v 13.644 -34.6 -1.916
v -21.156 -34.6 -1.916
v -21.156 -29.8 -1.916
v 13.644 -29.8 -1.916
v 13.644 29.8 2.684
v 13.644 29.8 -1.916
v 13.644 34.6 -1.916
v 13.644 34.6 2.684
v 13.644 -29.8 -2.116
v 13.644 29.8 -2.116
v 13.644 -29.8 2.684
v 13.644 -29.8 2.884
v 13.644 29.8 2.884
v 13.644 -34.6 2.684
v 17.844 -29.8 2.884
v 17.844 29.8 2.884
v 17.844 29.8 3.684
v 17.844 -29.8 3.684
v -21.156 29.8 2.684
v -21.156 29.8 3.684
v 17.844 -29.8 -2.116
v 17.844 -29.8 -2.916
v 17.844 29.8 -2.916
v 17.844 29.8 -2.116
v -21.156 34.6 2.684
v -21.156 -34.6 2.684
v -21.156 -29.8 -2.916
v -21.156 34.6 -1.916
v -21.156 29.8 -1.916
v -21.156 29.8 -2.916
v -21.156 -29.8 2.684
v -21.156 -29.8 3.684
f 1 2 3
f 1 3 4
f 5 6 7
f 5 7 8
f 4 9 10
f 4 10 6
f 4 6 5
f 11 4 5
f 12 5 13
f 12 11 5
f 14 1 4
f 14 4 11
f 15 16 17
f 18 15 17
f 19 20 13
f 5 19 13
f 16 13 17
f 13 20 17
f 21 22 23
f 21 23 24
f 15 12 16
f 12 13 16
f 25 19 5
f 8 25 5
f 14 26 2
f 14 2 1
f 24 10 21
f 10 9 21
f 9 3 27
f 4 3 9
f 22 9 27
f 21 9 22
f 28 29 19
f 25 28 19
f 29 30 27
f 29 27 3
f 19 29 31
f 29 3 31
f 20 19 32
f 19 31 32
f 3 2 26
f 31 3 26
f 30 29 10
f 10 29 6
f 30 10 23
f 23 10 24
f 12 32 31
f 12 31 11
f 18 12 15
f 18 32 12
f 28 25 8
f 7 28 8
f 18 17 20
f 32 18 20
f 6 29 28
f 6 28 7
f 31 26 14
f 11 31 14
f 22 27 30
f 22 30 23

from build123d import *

# Parameters (mm, degrees)
F0_W     = 34.8
F0_H     = 4.6
F1_DEPTH = 34.6
F0_W_2   = 4.2
F0_H_2   = 0.8
F2_DEPTH = 29.8


with BuildPart() as f1:
    # F0 (on Front) → F1 (new body, symmetric)
    with BuildSketch(Plane.XZ):
        with Locations((-3.756187, 0.384168)):
            Rectangle(F0_W, F0_H)
    extrude(amount=F1_DEPTH, both=True)

    # F0 (on Front) → F2 (join, symmetric)
    with BuildSketch(Plane.XZ):
        Polygon((13.643813, 3.684168), (-21.156187, 3.684168), (-21.156187, 2.684168), (13.643813, 2.684168), (13.643813, 2.884168), align=None)
        Polygon((13.643813, -1.915832), (-21.156187, -1.915832), (-21.156187, -2.915832), (13.643813, -2.915832), (13.643813, -2.115832), align=None)
        with Locations((15.743813, -2.515832)):
            Rectangle(F0_W_2, F0_H_2)
        with Locations((15.743813, 3.284168)):
            Rectangle(F0_W_2, F0_H_2)
    extrude(amount=F2_DEPTH, both=True)


solid = f1.part
